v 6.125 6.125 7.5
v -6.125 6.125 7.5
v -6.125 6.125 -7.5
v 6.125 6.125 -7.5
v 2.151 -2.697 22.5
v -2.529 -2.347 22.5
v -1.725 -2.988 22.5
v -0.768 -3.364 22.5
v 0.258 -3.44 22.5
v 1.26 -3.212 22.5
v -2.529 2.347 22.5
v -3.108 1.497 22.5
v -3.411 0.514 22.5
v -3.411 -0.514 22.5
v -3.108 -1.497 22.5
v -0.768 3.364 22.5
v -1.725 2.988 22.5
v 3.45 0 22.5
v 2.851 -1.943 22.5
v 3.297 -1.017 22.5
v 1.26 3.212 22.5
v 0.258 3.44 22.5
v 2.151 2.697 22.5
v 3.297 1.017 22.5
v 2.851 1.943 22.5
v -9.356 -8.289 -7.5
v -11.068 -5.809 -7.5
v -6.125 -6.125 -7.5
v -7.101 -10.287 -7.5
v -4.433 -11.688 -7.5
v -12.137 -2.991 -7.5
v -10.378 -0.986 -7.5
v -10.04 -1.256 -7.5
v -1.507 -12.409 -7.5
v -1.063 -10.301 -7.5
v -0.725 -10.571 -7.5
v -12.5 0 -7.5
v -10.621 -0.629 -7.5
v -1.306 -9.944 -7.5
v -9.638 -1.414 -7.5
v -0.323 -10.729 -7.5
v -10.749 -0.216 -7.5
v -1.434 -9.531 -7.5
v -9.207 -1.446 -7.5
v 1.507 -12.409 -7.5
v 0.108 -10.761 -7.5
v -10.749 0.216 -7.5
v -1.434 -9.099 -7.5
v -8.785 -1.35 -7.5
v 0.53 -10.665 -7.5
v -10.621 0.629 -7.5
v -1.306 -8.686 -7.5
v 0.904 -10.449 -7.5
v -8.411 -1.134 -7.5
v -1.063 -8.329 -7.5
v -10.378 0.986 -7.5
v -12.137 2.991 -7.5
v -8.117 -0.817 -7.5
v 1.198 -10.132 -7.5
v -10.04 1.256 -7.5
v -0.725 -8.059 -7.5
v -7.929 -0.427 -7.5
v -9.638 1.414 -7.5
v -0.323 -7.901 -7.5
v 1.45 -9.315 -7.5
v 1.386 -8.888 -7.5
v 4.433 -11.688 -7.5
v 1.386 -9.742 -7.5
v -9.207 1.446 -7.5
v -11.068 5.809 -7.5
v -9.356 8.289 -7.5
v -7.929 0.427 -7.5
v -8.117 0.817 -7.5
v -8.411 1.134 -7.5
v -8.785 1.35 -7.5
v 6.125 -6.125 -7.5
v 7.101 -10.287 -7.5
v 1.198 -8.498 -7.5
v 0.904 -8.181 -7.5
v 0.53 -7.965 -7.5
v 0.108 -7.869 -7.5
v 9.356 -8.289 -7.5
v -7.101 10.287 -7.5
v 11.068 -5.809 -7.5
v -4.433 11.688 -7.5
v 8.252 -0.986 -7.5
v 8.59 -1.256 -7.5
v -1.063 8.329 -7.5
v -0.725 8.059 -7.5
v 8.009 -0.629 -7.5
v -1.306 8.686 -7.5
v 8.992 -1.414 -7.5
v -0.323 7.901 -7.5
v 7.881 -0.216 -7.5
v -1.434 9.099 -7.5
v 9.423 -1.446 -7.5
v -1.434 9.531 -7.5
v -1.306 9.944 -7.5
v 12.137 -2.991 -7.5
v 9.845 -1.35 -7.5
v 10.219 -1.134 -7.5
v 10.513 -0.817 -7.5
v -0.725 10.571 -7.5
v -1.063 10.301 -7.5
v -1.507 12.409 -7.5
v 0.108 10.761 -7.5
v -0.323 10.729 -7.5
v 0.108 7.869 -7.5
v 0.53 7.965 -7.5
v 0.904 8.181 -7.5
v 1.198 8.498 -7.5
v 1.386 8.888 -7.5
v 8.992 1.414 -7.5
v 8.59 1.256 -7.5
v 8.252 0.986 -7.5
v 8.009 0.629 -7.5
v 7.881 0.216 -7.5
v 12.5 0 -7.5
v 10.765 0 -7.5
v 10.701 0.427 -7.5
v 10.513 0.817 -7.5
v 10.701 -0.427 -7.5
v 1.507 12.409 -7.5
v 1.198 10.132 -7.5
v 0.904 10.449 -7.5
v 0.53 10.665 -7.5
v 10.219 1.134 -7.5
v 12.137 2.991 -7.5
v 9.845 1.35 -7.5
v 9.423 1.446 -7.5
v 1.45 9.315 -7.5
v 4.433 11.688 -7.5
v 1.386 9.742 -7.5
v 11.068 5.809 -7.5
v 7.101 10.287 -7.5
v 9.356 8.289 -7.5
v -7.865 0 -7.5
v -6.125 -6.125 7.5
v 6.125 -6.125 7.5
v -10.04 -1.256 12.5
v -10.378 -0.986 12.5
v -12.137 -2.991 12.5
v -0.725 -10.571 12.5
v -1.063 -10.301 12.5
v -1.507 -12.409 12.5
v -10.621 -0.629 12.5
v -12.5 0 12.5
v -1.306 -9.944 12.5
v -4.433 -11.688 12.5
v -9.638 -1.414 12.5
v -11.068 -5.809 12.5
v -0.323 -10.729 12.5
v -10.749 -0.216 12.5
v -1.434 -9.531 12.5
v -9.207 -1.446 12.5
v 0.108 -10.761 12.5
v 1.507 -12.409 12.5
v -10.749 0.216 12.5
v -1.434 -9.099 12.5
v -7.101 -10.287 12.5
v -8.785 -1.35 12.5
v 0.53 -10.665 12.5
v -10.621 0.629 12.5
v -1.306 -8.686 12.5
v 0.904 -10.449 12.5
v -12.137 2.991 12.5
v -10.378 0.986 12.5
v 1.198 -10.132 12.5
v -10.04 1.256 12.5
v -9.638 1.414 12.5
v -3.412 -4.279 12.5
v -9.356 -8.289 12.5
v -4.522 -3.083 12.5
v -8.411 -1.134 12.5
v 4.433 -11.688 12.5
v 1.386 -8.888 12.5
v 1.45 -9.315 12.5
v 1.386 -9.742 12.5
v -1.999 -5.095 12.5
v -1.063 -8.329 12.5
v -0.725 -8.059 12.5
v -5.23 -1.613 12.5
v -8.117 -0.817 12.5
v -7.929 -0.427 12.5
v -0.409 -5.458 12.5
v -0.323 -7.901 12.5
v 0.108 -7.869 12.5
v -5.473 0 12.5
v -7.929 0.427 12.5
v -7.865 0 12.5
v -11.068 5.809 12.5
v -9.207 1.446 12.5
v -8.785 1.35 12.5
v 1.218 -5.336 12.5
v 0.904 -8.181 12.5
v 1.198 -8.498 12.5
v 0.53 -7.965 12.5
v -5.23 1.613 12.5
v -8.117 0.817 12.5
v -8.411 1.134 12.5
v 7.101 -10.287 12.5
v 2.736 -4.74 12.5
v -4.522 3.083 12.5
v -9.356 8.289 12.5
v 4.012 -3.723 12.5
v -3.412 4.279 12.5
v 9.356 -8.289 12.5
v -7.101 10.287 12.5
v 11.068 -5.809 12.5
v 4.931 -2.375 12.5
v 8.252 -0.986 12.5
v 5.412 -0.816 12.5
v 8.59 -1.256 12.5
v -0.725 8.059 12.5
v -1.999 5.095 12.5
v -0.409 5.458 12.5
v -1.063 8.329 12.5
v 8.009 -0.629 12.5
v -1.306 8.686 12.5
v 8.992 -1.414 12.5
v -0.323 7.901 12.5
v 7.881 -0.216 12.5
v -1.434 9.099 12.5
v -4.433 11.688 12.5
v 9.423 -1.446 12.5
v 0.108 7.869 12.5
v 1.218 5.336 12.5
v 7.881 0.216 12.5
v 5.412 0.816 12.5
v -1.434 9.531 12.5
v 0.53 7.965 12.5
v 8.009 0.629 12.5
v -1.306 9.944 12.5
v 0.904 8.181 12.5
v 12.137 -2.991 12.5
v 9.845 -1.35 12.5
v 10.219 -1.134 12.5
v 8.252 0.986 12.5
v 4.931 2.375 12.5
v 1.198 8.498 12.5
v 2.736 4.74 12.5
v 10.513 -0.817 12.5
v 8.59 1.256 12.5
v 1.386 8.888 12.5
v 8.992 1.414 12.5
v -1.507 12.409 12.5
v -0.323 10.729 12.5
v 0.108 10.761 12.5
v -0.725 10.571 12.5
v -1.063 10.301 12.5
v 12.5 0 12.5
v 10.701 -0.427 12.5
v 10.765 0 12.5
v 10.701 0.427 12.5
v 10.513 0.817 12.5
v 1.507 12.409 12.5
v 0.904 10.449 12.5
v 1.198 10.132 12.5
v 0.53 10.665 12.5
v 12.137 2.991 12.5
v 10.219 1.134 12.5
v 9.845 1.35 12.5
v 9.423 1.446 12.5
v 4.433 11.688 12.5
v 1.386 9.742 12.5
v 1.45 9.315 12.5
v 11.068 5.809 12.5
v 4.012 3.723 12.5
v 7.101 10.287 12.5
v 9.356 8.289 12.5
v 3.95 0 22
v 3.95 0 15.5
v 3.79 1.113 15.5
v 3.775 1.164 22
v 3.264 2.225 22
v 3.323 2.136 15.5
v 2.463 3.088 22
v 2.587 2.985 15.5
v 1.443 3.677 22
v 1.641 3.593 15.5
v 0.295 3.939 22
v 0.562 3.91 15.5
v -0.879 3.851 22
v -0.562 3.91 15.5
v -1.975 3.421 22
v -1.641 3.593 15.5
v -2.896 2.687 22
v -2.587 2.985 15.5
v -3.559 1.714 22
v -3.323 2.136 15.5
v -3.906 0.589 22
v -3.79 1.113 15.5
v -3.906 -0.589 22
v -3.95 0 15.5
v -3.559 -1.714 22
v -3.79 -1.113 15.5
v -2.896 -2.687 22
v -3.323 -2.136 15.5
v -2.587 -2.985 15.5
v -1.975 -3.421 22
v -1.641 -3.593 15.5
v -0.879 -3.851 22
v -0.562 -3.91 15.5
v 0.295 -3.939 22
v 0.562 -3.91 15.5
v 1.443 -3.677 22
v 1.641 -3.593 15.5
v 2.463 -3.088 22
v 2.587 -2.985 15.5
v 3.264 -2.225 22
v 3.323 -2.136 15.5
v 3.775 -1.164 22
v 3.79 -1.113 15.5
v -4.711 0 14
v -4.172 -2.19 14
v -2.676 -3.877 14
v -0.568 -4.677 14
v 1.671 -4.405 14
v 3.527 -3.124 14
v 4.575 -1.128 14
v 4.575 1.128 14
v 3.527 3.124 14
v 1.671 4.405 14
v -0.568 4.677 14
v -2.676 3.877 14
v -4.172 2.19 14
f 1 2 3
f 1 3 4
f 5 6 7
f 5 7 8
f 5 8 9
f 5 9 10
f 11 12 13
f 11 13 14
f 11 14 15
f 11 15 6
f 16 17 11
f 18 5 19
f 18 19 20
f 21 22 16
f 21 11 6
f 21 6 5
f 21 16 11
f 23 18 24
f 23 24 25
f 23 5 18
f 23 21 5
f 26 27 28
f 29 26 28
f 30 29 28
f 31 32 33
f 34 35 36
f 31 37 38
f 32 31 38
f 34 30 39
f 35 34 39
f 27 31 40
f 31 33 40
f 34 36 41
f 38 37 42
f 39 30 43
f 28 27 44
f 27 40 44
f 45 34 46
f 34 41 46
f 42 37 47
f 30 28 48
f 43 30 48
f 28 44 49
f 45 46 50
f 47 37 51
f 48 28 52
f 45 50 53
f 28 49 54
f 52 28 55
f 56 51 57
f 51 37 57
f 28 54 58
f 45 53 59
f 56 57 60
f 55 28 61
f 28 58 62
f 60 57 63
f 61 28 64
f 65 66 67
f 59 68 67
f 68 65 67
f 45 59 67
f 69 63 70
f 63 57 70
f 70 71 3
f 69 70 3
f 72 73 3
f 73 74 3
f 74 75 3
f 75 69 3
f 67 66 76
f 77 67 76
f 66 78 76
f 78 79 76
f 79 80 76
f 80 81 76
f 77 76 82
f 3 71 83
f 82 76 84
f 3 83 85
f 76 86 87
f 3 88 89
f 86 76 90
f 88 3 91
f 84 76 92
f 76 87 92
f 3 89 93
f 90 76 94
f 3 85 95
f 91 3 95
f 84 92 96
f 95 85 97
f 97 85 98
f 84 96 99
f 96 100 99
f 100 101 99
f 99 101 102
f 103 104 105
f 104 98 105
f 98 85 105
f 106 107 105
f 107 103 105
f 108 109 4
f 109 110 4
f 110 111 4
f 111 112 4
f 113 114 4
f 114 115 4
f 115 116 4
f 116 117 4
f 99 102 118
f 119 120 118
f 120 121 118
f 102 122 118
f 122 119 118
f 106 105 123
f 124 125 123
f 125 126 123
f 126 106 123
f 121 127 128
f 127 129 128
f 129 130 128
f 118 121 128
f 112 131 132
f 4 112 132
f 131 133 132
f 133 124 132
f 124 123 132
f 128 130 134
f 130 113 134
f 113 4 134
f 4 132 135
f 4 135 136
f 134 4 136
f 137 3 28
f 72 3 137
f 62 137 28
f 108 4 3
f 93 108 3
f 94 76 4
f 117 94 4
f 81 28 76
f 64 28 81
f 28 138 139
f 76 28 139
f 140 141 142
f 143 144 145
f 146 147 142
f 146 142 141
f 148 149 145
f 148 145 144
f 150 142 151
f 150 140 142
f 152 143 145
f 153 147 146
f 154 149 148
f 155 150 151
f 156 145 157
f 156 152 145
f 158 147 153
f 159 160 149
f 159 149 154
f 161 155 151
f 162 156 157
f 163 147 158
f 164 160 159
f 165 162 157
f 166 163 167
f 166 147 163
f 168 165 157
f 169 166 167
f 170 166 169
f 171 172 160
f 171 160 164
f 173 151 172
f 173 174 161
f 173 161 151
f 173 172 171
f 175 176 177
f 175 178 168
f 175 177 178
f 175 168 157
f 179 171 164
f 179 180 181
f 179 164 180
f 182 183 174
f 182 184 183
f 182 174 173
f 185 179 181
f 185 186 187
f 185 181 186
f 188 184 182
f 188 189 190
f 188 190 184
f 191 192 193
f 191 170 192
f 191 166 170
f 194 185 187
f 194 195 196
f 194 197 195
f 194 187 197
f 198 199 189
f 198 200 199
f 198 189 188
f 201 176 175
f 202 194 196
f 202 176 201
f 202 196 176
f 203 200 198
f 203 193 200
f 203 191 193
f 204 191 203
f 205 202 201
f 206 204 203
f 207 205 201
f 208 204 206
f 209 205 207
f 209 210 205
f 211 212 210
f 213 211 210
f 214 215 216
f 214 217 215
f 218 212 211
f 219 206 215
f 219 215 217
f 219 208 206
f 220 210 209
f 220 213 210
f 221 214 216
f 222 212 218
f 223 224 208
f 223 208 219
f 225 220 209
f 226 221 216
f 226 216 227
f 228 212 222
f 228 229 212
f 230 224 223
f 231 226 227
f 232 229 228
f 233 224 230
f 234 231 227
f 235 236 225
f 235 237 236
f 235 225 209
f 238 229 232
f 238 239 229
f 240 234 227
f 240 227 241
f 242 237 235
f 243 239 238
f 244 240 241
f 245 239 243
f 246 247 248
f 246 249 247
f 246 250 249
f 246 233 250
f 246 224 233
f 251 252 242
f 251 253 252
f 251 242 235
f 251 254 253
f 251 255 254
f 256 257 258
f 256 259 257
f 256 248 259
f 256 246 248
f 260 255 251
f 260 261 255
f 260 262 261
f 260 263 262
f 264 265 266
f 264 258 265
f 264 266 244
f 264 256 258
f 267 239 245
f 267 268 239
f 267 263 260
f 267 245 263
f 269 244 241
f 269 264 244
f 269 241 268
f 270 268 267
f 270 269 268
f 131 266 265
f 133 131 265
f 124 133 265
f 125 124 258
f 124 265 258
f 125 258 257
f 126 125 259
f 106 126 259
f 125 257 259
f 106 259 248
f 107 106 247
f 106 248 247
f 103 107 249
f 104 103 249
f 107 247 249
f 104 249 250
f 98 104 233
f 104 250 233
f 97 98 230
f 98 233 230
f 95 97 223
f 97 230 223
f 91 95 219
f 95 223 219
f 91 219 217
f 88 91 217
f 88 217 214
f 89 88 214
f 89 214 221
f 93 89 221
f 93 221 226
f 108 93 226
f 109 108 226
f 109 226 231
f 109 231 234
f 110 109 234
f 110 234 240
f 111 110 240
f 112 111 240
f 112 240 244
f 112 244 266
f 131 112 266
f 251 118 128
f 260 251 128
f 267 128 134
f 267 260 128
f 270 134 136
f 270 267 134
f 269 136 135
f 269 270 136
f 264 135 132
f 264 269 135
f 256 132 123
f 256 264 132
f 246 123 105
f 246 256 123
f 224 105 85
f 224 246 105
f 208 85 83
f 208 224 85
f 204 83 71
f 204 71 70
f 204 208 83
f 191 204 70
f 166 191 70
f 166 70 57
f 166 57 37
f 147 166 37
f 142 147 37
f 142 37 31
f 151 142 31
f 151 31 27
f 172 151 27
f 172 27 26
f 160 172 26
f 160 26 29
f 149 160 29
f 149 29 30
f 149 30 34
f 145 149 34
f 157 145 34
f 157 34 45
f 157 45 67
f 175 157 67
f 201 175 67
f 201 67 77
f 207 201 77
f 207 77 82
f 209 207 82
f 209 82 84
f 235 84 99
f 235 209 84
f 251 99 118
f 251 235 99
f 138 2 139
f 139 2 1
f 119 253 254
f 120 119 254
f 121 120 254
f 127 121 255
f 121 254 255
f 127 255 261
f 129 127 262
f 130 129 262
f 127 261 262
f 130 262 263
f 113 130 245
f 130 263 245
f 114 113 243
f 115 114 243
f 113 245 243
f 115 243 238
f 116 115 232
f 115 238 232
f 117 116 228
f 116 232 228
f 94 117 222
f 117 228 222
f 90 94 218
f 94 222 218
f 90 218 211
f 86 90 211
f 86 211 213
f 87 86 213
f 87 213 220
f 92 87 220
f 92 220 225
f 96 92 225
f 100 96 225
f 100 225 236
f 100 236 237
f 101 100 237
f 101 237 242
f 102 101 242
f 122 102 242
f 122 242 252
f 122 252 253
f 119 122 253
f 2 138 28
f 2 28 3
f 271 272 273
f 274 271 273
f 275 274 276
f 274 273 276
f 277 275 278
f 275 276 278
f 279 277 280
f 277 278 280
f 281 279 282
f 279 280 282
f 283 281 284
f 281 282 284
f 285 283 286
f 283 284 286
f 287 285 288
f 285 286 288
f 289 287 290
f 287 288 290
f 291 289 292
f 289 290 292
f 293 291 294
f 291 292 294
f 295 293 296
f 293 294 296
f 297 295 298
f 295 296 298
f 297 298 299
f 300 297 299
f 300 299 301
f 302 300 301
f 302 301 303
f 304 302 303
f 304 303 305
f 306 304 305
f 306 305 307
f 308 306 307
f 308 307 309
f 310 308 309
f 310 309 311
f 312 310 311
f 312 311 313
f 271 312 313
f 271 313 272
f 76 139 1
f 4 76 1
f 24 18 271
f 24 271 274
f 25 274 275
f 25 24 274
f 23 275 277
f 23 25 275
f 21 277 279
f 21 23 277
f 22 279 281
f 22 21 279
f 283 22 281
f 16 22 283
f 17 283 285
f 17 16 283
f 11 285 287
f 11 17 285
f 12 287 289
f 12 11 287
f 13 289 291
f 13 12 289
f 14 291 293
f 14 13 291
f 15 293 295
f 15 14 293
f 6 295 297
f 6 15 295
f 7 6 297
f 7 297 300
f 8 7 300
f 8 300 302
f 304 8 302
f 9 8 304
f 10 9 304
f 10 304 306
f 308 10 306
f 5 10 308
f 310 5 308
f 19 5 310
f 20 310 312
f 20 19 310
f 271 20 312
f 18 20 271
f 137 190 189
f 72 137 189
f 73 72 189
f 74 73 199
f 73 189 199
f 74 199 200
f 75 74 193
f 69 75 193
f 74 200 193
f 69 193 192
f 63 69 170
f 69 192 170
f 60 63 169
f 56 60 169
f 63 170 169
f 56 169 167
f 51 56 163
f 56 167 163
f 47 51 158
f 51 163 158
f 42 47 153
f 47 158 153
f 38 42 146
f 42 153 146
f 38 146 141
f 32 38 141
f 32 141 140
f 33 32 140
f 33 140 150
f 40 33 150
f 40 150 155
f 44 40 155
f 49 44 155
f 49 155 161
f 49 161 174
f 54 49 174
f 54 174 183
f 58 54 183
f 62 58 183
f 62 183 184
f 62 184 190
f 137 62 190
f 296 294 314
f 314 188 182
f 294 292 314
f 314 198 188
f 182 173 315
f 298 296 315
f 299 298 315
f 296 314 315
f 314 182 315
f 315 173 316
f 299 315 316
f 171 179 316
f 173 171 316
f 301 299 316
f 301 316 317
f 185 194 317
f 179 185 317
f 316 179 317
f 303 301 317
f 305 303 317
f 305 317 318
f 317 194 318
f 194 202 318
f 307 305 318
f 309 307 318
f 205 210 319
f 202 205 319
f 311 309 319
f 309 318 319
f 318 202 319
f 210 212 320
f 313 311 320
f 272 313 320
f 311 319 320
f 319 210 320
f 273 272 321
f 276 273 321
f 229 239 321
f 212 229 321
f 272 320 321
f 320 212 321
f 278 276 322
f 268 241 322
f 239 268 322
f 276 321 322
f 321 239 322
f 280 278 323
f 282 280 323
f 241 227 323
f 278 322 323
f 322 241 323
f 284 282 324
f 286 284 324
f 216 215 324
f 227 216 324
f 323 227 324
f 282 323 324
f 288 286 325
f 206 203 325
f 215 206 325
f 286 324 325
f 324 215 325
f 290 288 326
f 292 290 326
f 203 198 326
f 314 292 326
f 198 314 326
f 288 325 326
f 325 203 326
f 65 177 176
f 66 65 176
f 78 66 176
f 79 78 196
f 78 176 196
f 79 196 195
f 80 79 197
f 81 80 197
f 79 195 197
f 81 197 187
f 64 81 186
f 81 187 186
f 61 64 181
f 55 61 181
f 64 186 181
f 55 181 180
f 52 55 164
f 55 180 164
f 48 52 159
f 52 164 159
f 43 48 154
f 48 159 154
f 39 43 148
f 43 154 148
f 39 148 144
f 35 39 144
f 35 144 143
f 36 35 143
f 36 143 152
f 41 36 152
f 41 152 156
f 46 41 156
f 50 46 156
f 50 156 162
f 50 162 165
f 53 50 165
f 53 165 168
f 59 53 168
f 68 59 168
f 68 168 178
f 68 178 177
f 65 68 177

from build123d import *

# Parameters (mm, degrees)
SKETCH1_R           = 12.5
BOSS_EXTRUDE1_DEPTH = 7.5
CUT_EXTRUDE1_REACH  = 25.184
SKETCH8_W           = 12.25
SKETCH8_H           = 12.25
SKETCH11_R          = 1.45
CUT_EXTRUDE4_DEPTH  = 24.184046239
BOSS_EXTRUDE2_START = 5
SKETCH14_R          = 12.5
BOSS_EXTRUDE2_DEPTH = 5
SKETCH15_R          = 3.95
BOSS_EXTRUDE3_DEPTH = 7
CHAMFER1_SIZE       = 0.5
SKETCH18_R          = 1.45
CUT_EXTRUDE6_DEPTH  = 30


with BuildPart() as part:
    # Sketch1 → Boss-Extrude1 (new, symmetric)
    with BuildSketch(Plane.XY):
        Circle(SKETCH1_R)
    extrude(amount=BOSS_EXTRUDE1_DEPTH, both=True)

    # Sketch8 → Cut-Extrude1 (cut, up to next)
    with BuildSketch(Plane.XY.offset(7.5), mode=Mode.PRIVATE) as cut_extrude1_sk1:
        Rectangle(SKETCH8_W, SKETCH8_H)
    cut_extrude1_tool1 = extrude(cut_extrude1_sk1.sketch, amount=-CUT_EXTRUDE1_REACH, mode=Mode.PRIVATE) & part.part
    add(cut_extrude1_tool1.solids().sort_by_distance((0, 0, 7.5))[0], mode=Mode.SUBTRACT)

    # Sketch11 → Cut-Extrude4 (cut, through all)
    with BuildSketch(Plane.XY.offset(7.5)):
        with Locations((9.315, 0)):
            Circle(SKETCH11_R)
        with Locations((0, -9.315)):
            Circle(SKETCH11_R)
        with Locations((-9.315, 0)):
            Circle(SKETCH11_R)
        with Locations((0, 9.315)):
            Circle(SKETCH11_R)
    extrude(amount=-CUT_EXTRUDE4_DEPTH, mode=Mode.SUBTRACT)

    # Sketch14 → Boss-Extrude2 (add)
    with BuildSketch(Plane.XY.offset(7.5).offset(BOSS_EXTRUDE2_START)):
        Circle(SKETCH14_R)
    extrude(amount=-BOSS_EXTRUDE2_DEPTH)

    # Sketch13 → Revolve1 (revolve)
    with BuildSketch(Plane(origin=(0, 0, 0), x_dir=(1, 0, 0), z_dir=(0, 1, 0)), mode=Mode.PRIVATE) as revolve1_sk:
        Polygon((0, -15.5), (3.95, -15.5), (7.5, -8.506732209), (0, -8.506732209), align=None)
    revolve(revolve1_sk.sketch.rotate(Axis((0, 0, 11.965062333), (0, 0, 1)), 180), axis=Axis((0, 0, 11.965062333), (0, 0, 1)))

    # Sketch15 → Boss-Extrude3 (add)
    with BuildSketch(Plane.XY.offset(15.5)):
        Circle(SKETCH15_R)
    extrude(amount=BOSS_EXTRUDE3_DEPTH)

    # Chamfer1
    chamfer1_edges = [part.edges().sort_by_distance(p)[0] for p in [
        (-3.95, 0, 22.5),
    ]]
    chamfer(chamfer1_edges, length=CHAMFER1_SIZE)

    # Sketch18 → Cut-Extrude6 (cut)
    with BuildSketch(Plane.XY.offset(12.5)):
        with Locations((-9.315, 0)):
            Circle(SKETCH18_R)
        with Locations((0, -9.315)):
            Circle(SKETCH18_R)
        with Locations((9.315, 0)):
            Circle(SKETCH18_R)
        with Locations((0, 9.315)):
            Circle(SKETCH18_R)
    extrude(amount=-CUT_EXTRUDE6_DEPTH, mode=Mode.SUBTRACT)


solid = part.part
